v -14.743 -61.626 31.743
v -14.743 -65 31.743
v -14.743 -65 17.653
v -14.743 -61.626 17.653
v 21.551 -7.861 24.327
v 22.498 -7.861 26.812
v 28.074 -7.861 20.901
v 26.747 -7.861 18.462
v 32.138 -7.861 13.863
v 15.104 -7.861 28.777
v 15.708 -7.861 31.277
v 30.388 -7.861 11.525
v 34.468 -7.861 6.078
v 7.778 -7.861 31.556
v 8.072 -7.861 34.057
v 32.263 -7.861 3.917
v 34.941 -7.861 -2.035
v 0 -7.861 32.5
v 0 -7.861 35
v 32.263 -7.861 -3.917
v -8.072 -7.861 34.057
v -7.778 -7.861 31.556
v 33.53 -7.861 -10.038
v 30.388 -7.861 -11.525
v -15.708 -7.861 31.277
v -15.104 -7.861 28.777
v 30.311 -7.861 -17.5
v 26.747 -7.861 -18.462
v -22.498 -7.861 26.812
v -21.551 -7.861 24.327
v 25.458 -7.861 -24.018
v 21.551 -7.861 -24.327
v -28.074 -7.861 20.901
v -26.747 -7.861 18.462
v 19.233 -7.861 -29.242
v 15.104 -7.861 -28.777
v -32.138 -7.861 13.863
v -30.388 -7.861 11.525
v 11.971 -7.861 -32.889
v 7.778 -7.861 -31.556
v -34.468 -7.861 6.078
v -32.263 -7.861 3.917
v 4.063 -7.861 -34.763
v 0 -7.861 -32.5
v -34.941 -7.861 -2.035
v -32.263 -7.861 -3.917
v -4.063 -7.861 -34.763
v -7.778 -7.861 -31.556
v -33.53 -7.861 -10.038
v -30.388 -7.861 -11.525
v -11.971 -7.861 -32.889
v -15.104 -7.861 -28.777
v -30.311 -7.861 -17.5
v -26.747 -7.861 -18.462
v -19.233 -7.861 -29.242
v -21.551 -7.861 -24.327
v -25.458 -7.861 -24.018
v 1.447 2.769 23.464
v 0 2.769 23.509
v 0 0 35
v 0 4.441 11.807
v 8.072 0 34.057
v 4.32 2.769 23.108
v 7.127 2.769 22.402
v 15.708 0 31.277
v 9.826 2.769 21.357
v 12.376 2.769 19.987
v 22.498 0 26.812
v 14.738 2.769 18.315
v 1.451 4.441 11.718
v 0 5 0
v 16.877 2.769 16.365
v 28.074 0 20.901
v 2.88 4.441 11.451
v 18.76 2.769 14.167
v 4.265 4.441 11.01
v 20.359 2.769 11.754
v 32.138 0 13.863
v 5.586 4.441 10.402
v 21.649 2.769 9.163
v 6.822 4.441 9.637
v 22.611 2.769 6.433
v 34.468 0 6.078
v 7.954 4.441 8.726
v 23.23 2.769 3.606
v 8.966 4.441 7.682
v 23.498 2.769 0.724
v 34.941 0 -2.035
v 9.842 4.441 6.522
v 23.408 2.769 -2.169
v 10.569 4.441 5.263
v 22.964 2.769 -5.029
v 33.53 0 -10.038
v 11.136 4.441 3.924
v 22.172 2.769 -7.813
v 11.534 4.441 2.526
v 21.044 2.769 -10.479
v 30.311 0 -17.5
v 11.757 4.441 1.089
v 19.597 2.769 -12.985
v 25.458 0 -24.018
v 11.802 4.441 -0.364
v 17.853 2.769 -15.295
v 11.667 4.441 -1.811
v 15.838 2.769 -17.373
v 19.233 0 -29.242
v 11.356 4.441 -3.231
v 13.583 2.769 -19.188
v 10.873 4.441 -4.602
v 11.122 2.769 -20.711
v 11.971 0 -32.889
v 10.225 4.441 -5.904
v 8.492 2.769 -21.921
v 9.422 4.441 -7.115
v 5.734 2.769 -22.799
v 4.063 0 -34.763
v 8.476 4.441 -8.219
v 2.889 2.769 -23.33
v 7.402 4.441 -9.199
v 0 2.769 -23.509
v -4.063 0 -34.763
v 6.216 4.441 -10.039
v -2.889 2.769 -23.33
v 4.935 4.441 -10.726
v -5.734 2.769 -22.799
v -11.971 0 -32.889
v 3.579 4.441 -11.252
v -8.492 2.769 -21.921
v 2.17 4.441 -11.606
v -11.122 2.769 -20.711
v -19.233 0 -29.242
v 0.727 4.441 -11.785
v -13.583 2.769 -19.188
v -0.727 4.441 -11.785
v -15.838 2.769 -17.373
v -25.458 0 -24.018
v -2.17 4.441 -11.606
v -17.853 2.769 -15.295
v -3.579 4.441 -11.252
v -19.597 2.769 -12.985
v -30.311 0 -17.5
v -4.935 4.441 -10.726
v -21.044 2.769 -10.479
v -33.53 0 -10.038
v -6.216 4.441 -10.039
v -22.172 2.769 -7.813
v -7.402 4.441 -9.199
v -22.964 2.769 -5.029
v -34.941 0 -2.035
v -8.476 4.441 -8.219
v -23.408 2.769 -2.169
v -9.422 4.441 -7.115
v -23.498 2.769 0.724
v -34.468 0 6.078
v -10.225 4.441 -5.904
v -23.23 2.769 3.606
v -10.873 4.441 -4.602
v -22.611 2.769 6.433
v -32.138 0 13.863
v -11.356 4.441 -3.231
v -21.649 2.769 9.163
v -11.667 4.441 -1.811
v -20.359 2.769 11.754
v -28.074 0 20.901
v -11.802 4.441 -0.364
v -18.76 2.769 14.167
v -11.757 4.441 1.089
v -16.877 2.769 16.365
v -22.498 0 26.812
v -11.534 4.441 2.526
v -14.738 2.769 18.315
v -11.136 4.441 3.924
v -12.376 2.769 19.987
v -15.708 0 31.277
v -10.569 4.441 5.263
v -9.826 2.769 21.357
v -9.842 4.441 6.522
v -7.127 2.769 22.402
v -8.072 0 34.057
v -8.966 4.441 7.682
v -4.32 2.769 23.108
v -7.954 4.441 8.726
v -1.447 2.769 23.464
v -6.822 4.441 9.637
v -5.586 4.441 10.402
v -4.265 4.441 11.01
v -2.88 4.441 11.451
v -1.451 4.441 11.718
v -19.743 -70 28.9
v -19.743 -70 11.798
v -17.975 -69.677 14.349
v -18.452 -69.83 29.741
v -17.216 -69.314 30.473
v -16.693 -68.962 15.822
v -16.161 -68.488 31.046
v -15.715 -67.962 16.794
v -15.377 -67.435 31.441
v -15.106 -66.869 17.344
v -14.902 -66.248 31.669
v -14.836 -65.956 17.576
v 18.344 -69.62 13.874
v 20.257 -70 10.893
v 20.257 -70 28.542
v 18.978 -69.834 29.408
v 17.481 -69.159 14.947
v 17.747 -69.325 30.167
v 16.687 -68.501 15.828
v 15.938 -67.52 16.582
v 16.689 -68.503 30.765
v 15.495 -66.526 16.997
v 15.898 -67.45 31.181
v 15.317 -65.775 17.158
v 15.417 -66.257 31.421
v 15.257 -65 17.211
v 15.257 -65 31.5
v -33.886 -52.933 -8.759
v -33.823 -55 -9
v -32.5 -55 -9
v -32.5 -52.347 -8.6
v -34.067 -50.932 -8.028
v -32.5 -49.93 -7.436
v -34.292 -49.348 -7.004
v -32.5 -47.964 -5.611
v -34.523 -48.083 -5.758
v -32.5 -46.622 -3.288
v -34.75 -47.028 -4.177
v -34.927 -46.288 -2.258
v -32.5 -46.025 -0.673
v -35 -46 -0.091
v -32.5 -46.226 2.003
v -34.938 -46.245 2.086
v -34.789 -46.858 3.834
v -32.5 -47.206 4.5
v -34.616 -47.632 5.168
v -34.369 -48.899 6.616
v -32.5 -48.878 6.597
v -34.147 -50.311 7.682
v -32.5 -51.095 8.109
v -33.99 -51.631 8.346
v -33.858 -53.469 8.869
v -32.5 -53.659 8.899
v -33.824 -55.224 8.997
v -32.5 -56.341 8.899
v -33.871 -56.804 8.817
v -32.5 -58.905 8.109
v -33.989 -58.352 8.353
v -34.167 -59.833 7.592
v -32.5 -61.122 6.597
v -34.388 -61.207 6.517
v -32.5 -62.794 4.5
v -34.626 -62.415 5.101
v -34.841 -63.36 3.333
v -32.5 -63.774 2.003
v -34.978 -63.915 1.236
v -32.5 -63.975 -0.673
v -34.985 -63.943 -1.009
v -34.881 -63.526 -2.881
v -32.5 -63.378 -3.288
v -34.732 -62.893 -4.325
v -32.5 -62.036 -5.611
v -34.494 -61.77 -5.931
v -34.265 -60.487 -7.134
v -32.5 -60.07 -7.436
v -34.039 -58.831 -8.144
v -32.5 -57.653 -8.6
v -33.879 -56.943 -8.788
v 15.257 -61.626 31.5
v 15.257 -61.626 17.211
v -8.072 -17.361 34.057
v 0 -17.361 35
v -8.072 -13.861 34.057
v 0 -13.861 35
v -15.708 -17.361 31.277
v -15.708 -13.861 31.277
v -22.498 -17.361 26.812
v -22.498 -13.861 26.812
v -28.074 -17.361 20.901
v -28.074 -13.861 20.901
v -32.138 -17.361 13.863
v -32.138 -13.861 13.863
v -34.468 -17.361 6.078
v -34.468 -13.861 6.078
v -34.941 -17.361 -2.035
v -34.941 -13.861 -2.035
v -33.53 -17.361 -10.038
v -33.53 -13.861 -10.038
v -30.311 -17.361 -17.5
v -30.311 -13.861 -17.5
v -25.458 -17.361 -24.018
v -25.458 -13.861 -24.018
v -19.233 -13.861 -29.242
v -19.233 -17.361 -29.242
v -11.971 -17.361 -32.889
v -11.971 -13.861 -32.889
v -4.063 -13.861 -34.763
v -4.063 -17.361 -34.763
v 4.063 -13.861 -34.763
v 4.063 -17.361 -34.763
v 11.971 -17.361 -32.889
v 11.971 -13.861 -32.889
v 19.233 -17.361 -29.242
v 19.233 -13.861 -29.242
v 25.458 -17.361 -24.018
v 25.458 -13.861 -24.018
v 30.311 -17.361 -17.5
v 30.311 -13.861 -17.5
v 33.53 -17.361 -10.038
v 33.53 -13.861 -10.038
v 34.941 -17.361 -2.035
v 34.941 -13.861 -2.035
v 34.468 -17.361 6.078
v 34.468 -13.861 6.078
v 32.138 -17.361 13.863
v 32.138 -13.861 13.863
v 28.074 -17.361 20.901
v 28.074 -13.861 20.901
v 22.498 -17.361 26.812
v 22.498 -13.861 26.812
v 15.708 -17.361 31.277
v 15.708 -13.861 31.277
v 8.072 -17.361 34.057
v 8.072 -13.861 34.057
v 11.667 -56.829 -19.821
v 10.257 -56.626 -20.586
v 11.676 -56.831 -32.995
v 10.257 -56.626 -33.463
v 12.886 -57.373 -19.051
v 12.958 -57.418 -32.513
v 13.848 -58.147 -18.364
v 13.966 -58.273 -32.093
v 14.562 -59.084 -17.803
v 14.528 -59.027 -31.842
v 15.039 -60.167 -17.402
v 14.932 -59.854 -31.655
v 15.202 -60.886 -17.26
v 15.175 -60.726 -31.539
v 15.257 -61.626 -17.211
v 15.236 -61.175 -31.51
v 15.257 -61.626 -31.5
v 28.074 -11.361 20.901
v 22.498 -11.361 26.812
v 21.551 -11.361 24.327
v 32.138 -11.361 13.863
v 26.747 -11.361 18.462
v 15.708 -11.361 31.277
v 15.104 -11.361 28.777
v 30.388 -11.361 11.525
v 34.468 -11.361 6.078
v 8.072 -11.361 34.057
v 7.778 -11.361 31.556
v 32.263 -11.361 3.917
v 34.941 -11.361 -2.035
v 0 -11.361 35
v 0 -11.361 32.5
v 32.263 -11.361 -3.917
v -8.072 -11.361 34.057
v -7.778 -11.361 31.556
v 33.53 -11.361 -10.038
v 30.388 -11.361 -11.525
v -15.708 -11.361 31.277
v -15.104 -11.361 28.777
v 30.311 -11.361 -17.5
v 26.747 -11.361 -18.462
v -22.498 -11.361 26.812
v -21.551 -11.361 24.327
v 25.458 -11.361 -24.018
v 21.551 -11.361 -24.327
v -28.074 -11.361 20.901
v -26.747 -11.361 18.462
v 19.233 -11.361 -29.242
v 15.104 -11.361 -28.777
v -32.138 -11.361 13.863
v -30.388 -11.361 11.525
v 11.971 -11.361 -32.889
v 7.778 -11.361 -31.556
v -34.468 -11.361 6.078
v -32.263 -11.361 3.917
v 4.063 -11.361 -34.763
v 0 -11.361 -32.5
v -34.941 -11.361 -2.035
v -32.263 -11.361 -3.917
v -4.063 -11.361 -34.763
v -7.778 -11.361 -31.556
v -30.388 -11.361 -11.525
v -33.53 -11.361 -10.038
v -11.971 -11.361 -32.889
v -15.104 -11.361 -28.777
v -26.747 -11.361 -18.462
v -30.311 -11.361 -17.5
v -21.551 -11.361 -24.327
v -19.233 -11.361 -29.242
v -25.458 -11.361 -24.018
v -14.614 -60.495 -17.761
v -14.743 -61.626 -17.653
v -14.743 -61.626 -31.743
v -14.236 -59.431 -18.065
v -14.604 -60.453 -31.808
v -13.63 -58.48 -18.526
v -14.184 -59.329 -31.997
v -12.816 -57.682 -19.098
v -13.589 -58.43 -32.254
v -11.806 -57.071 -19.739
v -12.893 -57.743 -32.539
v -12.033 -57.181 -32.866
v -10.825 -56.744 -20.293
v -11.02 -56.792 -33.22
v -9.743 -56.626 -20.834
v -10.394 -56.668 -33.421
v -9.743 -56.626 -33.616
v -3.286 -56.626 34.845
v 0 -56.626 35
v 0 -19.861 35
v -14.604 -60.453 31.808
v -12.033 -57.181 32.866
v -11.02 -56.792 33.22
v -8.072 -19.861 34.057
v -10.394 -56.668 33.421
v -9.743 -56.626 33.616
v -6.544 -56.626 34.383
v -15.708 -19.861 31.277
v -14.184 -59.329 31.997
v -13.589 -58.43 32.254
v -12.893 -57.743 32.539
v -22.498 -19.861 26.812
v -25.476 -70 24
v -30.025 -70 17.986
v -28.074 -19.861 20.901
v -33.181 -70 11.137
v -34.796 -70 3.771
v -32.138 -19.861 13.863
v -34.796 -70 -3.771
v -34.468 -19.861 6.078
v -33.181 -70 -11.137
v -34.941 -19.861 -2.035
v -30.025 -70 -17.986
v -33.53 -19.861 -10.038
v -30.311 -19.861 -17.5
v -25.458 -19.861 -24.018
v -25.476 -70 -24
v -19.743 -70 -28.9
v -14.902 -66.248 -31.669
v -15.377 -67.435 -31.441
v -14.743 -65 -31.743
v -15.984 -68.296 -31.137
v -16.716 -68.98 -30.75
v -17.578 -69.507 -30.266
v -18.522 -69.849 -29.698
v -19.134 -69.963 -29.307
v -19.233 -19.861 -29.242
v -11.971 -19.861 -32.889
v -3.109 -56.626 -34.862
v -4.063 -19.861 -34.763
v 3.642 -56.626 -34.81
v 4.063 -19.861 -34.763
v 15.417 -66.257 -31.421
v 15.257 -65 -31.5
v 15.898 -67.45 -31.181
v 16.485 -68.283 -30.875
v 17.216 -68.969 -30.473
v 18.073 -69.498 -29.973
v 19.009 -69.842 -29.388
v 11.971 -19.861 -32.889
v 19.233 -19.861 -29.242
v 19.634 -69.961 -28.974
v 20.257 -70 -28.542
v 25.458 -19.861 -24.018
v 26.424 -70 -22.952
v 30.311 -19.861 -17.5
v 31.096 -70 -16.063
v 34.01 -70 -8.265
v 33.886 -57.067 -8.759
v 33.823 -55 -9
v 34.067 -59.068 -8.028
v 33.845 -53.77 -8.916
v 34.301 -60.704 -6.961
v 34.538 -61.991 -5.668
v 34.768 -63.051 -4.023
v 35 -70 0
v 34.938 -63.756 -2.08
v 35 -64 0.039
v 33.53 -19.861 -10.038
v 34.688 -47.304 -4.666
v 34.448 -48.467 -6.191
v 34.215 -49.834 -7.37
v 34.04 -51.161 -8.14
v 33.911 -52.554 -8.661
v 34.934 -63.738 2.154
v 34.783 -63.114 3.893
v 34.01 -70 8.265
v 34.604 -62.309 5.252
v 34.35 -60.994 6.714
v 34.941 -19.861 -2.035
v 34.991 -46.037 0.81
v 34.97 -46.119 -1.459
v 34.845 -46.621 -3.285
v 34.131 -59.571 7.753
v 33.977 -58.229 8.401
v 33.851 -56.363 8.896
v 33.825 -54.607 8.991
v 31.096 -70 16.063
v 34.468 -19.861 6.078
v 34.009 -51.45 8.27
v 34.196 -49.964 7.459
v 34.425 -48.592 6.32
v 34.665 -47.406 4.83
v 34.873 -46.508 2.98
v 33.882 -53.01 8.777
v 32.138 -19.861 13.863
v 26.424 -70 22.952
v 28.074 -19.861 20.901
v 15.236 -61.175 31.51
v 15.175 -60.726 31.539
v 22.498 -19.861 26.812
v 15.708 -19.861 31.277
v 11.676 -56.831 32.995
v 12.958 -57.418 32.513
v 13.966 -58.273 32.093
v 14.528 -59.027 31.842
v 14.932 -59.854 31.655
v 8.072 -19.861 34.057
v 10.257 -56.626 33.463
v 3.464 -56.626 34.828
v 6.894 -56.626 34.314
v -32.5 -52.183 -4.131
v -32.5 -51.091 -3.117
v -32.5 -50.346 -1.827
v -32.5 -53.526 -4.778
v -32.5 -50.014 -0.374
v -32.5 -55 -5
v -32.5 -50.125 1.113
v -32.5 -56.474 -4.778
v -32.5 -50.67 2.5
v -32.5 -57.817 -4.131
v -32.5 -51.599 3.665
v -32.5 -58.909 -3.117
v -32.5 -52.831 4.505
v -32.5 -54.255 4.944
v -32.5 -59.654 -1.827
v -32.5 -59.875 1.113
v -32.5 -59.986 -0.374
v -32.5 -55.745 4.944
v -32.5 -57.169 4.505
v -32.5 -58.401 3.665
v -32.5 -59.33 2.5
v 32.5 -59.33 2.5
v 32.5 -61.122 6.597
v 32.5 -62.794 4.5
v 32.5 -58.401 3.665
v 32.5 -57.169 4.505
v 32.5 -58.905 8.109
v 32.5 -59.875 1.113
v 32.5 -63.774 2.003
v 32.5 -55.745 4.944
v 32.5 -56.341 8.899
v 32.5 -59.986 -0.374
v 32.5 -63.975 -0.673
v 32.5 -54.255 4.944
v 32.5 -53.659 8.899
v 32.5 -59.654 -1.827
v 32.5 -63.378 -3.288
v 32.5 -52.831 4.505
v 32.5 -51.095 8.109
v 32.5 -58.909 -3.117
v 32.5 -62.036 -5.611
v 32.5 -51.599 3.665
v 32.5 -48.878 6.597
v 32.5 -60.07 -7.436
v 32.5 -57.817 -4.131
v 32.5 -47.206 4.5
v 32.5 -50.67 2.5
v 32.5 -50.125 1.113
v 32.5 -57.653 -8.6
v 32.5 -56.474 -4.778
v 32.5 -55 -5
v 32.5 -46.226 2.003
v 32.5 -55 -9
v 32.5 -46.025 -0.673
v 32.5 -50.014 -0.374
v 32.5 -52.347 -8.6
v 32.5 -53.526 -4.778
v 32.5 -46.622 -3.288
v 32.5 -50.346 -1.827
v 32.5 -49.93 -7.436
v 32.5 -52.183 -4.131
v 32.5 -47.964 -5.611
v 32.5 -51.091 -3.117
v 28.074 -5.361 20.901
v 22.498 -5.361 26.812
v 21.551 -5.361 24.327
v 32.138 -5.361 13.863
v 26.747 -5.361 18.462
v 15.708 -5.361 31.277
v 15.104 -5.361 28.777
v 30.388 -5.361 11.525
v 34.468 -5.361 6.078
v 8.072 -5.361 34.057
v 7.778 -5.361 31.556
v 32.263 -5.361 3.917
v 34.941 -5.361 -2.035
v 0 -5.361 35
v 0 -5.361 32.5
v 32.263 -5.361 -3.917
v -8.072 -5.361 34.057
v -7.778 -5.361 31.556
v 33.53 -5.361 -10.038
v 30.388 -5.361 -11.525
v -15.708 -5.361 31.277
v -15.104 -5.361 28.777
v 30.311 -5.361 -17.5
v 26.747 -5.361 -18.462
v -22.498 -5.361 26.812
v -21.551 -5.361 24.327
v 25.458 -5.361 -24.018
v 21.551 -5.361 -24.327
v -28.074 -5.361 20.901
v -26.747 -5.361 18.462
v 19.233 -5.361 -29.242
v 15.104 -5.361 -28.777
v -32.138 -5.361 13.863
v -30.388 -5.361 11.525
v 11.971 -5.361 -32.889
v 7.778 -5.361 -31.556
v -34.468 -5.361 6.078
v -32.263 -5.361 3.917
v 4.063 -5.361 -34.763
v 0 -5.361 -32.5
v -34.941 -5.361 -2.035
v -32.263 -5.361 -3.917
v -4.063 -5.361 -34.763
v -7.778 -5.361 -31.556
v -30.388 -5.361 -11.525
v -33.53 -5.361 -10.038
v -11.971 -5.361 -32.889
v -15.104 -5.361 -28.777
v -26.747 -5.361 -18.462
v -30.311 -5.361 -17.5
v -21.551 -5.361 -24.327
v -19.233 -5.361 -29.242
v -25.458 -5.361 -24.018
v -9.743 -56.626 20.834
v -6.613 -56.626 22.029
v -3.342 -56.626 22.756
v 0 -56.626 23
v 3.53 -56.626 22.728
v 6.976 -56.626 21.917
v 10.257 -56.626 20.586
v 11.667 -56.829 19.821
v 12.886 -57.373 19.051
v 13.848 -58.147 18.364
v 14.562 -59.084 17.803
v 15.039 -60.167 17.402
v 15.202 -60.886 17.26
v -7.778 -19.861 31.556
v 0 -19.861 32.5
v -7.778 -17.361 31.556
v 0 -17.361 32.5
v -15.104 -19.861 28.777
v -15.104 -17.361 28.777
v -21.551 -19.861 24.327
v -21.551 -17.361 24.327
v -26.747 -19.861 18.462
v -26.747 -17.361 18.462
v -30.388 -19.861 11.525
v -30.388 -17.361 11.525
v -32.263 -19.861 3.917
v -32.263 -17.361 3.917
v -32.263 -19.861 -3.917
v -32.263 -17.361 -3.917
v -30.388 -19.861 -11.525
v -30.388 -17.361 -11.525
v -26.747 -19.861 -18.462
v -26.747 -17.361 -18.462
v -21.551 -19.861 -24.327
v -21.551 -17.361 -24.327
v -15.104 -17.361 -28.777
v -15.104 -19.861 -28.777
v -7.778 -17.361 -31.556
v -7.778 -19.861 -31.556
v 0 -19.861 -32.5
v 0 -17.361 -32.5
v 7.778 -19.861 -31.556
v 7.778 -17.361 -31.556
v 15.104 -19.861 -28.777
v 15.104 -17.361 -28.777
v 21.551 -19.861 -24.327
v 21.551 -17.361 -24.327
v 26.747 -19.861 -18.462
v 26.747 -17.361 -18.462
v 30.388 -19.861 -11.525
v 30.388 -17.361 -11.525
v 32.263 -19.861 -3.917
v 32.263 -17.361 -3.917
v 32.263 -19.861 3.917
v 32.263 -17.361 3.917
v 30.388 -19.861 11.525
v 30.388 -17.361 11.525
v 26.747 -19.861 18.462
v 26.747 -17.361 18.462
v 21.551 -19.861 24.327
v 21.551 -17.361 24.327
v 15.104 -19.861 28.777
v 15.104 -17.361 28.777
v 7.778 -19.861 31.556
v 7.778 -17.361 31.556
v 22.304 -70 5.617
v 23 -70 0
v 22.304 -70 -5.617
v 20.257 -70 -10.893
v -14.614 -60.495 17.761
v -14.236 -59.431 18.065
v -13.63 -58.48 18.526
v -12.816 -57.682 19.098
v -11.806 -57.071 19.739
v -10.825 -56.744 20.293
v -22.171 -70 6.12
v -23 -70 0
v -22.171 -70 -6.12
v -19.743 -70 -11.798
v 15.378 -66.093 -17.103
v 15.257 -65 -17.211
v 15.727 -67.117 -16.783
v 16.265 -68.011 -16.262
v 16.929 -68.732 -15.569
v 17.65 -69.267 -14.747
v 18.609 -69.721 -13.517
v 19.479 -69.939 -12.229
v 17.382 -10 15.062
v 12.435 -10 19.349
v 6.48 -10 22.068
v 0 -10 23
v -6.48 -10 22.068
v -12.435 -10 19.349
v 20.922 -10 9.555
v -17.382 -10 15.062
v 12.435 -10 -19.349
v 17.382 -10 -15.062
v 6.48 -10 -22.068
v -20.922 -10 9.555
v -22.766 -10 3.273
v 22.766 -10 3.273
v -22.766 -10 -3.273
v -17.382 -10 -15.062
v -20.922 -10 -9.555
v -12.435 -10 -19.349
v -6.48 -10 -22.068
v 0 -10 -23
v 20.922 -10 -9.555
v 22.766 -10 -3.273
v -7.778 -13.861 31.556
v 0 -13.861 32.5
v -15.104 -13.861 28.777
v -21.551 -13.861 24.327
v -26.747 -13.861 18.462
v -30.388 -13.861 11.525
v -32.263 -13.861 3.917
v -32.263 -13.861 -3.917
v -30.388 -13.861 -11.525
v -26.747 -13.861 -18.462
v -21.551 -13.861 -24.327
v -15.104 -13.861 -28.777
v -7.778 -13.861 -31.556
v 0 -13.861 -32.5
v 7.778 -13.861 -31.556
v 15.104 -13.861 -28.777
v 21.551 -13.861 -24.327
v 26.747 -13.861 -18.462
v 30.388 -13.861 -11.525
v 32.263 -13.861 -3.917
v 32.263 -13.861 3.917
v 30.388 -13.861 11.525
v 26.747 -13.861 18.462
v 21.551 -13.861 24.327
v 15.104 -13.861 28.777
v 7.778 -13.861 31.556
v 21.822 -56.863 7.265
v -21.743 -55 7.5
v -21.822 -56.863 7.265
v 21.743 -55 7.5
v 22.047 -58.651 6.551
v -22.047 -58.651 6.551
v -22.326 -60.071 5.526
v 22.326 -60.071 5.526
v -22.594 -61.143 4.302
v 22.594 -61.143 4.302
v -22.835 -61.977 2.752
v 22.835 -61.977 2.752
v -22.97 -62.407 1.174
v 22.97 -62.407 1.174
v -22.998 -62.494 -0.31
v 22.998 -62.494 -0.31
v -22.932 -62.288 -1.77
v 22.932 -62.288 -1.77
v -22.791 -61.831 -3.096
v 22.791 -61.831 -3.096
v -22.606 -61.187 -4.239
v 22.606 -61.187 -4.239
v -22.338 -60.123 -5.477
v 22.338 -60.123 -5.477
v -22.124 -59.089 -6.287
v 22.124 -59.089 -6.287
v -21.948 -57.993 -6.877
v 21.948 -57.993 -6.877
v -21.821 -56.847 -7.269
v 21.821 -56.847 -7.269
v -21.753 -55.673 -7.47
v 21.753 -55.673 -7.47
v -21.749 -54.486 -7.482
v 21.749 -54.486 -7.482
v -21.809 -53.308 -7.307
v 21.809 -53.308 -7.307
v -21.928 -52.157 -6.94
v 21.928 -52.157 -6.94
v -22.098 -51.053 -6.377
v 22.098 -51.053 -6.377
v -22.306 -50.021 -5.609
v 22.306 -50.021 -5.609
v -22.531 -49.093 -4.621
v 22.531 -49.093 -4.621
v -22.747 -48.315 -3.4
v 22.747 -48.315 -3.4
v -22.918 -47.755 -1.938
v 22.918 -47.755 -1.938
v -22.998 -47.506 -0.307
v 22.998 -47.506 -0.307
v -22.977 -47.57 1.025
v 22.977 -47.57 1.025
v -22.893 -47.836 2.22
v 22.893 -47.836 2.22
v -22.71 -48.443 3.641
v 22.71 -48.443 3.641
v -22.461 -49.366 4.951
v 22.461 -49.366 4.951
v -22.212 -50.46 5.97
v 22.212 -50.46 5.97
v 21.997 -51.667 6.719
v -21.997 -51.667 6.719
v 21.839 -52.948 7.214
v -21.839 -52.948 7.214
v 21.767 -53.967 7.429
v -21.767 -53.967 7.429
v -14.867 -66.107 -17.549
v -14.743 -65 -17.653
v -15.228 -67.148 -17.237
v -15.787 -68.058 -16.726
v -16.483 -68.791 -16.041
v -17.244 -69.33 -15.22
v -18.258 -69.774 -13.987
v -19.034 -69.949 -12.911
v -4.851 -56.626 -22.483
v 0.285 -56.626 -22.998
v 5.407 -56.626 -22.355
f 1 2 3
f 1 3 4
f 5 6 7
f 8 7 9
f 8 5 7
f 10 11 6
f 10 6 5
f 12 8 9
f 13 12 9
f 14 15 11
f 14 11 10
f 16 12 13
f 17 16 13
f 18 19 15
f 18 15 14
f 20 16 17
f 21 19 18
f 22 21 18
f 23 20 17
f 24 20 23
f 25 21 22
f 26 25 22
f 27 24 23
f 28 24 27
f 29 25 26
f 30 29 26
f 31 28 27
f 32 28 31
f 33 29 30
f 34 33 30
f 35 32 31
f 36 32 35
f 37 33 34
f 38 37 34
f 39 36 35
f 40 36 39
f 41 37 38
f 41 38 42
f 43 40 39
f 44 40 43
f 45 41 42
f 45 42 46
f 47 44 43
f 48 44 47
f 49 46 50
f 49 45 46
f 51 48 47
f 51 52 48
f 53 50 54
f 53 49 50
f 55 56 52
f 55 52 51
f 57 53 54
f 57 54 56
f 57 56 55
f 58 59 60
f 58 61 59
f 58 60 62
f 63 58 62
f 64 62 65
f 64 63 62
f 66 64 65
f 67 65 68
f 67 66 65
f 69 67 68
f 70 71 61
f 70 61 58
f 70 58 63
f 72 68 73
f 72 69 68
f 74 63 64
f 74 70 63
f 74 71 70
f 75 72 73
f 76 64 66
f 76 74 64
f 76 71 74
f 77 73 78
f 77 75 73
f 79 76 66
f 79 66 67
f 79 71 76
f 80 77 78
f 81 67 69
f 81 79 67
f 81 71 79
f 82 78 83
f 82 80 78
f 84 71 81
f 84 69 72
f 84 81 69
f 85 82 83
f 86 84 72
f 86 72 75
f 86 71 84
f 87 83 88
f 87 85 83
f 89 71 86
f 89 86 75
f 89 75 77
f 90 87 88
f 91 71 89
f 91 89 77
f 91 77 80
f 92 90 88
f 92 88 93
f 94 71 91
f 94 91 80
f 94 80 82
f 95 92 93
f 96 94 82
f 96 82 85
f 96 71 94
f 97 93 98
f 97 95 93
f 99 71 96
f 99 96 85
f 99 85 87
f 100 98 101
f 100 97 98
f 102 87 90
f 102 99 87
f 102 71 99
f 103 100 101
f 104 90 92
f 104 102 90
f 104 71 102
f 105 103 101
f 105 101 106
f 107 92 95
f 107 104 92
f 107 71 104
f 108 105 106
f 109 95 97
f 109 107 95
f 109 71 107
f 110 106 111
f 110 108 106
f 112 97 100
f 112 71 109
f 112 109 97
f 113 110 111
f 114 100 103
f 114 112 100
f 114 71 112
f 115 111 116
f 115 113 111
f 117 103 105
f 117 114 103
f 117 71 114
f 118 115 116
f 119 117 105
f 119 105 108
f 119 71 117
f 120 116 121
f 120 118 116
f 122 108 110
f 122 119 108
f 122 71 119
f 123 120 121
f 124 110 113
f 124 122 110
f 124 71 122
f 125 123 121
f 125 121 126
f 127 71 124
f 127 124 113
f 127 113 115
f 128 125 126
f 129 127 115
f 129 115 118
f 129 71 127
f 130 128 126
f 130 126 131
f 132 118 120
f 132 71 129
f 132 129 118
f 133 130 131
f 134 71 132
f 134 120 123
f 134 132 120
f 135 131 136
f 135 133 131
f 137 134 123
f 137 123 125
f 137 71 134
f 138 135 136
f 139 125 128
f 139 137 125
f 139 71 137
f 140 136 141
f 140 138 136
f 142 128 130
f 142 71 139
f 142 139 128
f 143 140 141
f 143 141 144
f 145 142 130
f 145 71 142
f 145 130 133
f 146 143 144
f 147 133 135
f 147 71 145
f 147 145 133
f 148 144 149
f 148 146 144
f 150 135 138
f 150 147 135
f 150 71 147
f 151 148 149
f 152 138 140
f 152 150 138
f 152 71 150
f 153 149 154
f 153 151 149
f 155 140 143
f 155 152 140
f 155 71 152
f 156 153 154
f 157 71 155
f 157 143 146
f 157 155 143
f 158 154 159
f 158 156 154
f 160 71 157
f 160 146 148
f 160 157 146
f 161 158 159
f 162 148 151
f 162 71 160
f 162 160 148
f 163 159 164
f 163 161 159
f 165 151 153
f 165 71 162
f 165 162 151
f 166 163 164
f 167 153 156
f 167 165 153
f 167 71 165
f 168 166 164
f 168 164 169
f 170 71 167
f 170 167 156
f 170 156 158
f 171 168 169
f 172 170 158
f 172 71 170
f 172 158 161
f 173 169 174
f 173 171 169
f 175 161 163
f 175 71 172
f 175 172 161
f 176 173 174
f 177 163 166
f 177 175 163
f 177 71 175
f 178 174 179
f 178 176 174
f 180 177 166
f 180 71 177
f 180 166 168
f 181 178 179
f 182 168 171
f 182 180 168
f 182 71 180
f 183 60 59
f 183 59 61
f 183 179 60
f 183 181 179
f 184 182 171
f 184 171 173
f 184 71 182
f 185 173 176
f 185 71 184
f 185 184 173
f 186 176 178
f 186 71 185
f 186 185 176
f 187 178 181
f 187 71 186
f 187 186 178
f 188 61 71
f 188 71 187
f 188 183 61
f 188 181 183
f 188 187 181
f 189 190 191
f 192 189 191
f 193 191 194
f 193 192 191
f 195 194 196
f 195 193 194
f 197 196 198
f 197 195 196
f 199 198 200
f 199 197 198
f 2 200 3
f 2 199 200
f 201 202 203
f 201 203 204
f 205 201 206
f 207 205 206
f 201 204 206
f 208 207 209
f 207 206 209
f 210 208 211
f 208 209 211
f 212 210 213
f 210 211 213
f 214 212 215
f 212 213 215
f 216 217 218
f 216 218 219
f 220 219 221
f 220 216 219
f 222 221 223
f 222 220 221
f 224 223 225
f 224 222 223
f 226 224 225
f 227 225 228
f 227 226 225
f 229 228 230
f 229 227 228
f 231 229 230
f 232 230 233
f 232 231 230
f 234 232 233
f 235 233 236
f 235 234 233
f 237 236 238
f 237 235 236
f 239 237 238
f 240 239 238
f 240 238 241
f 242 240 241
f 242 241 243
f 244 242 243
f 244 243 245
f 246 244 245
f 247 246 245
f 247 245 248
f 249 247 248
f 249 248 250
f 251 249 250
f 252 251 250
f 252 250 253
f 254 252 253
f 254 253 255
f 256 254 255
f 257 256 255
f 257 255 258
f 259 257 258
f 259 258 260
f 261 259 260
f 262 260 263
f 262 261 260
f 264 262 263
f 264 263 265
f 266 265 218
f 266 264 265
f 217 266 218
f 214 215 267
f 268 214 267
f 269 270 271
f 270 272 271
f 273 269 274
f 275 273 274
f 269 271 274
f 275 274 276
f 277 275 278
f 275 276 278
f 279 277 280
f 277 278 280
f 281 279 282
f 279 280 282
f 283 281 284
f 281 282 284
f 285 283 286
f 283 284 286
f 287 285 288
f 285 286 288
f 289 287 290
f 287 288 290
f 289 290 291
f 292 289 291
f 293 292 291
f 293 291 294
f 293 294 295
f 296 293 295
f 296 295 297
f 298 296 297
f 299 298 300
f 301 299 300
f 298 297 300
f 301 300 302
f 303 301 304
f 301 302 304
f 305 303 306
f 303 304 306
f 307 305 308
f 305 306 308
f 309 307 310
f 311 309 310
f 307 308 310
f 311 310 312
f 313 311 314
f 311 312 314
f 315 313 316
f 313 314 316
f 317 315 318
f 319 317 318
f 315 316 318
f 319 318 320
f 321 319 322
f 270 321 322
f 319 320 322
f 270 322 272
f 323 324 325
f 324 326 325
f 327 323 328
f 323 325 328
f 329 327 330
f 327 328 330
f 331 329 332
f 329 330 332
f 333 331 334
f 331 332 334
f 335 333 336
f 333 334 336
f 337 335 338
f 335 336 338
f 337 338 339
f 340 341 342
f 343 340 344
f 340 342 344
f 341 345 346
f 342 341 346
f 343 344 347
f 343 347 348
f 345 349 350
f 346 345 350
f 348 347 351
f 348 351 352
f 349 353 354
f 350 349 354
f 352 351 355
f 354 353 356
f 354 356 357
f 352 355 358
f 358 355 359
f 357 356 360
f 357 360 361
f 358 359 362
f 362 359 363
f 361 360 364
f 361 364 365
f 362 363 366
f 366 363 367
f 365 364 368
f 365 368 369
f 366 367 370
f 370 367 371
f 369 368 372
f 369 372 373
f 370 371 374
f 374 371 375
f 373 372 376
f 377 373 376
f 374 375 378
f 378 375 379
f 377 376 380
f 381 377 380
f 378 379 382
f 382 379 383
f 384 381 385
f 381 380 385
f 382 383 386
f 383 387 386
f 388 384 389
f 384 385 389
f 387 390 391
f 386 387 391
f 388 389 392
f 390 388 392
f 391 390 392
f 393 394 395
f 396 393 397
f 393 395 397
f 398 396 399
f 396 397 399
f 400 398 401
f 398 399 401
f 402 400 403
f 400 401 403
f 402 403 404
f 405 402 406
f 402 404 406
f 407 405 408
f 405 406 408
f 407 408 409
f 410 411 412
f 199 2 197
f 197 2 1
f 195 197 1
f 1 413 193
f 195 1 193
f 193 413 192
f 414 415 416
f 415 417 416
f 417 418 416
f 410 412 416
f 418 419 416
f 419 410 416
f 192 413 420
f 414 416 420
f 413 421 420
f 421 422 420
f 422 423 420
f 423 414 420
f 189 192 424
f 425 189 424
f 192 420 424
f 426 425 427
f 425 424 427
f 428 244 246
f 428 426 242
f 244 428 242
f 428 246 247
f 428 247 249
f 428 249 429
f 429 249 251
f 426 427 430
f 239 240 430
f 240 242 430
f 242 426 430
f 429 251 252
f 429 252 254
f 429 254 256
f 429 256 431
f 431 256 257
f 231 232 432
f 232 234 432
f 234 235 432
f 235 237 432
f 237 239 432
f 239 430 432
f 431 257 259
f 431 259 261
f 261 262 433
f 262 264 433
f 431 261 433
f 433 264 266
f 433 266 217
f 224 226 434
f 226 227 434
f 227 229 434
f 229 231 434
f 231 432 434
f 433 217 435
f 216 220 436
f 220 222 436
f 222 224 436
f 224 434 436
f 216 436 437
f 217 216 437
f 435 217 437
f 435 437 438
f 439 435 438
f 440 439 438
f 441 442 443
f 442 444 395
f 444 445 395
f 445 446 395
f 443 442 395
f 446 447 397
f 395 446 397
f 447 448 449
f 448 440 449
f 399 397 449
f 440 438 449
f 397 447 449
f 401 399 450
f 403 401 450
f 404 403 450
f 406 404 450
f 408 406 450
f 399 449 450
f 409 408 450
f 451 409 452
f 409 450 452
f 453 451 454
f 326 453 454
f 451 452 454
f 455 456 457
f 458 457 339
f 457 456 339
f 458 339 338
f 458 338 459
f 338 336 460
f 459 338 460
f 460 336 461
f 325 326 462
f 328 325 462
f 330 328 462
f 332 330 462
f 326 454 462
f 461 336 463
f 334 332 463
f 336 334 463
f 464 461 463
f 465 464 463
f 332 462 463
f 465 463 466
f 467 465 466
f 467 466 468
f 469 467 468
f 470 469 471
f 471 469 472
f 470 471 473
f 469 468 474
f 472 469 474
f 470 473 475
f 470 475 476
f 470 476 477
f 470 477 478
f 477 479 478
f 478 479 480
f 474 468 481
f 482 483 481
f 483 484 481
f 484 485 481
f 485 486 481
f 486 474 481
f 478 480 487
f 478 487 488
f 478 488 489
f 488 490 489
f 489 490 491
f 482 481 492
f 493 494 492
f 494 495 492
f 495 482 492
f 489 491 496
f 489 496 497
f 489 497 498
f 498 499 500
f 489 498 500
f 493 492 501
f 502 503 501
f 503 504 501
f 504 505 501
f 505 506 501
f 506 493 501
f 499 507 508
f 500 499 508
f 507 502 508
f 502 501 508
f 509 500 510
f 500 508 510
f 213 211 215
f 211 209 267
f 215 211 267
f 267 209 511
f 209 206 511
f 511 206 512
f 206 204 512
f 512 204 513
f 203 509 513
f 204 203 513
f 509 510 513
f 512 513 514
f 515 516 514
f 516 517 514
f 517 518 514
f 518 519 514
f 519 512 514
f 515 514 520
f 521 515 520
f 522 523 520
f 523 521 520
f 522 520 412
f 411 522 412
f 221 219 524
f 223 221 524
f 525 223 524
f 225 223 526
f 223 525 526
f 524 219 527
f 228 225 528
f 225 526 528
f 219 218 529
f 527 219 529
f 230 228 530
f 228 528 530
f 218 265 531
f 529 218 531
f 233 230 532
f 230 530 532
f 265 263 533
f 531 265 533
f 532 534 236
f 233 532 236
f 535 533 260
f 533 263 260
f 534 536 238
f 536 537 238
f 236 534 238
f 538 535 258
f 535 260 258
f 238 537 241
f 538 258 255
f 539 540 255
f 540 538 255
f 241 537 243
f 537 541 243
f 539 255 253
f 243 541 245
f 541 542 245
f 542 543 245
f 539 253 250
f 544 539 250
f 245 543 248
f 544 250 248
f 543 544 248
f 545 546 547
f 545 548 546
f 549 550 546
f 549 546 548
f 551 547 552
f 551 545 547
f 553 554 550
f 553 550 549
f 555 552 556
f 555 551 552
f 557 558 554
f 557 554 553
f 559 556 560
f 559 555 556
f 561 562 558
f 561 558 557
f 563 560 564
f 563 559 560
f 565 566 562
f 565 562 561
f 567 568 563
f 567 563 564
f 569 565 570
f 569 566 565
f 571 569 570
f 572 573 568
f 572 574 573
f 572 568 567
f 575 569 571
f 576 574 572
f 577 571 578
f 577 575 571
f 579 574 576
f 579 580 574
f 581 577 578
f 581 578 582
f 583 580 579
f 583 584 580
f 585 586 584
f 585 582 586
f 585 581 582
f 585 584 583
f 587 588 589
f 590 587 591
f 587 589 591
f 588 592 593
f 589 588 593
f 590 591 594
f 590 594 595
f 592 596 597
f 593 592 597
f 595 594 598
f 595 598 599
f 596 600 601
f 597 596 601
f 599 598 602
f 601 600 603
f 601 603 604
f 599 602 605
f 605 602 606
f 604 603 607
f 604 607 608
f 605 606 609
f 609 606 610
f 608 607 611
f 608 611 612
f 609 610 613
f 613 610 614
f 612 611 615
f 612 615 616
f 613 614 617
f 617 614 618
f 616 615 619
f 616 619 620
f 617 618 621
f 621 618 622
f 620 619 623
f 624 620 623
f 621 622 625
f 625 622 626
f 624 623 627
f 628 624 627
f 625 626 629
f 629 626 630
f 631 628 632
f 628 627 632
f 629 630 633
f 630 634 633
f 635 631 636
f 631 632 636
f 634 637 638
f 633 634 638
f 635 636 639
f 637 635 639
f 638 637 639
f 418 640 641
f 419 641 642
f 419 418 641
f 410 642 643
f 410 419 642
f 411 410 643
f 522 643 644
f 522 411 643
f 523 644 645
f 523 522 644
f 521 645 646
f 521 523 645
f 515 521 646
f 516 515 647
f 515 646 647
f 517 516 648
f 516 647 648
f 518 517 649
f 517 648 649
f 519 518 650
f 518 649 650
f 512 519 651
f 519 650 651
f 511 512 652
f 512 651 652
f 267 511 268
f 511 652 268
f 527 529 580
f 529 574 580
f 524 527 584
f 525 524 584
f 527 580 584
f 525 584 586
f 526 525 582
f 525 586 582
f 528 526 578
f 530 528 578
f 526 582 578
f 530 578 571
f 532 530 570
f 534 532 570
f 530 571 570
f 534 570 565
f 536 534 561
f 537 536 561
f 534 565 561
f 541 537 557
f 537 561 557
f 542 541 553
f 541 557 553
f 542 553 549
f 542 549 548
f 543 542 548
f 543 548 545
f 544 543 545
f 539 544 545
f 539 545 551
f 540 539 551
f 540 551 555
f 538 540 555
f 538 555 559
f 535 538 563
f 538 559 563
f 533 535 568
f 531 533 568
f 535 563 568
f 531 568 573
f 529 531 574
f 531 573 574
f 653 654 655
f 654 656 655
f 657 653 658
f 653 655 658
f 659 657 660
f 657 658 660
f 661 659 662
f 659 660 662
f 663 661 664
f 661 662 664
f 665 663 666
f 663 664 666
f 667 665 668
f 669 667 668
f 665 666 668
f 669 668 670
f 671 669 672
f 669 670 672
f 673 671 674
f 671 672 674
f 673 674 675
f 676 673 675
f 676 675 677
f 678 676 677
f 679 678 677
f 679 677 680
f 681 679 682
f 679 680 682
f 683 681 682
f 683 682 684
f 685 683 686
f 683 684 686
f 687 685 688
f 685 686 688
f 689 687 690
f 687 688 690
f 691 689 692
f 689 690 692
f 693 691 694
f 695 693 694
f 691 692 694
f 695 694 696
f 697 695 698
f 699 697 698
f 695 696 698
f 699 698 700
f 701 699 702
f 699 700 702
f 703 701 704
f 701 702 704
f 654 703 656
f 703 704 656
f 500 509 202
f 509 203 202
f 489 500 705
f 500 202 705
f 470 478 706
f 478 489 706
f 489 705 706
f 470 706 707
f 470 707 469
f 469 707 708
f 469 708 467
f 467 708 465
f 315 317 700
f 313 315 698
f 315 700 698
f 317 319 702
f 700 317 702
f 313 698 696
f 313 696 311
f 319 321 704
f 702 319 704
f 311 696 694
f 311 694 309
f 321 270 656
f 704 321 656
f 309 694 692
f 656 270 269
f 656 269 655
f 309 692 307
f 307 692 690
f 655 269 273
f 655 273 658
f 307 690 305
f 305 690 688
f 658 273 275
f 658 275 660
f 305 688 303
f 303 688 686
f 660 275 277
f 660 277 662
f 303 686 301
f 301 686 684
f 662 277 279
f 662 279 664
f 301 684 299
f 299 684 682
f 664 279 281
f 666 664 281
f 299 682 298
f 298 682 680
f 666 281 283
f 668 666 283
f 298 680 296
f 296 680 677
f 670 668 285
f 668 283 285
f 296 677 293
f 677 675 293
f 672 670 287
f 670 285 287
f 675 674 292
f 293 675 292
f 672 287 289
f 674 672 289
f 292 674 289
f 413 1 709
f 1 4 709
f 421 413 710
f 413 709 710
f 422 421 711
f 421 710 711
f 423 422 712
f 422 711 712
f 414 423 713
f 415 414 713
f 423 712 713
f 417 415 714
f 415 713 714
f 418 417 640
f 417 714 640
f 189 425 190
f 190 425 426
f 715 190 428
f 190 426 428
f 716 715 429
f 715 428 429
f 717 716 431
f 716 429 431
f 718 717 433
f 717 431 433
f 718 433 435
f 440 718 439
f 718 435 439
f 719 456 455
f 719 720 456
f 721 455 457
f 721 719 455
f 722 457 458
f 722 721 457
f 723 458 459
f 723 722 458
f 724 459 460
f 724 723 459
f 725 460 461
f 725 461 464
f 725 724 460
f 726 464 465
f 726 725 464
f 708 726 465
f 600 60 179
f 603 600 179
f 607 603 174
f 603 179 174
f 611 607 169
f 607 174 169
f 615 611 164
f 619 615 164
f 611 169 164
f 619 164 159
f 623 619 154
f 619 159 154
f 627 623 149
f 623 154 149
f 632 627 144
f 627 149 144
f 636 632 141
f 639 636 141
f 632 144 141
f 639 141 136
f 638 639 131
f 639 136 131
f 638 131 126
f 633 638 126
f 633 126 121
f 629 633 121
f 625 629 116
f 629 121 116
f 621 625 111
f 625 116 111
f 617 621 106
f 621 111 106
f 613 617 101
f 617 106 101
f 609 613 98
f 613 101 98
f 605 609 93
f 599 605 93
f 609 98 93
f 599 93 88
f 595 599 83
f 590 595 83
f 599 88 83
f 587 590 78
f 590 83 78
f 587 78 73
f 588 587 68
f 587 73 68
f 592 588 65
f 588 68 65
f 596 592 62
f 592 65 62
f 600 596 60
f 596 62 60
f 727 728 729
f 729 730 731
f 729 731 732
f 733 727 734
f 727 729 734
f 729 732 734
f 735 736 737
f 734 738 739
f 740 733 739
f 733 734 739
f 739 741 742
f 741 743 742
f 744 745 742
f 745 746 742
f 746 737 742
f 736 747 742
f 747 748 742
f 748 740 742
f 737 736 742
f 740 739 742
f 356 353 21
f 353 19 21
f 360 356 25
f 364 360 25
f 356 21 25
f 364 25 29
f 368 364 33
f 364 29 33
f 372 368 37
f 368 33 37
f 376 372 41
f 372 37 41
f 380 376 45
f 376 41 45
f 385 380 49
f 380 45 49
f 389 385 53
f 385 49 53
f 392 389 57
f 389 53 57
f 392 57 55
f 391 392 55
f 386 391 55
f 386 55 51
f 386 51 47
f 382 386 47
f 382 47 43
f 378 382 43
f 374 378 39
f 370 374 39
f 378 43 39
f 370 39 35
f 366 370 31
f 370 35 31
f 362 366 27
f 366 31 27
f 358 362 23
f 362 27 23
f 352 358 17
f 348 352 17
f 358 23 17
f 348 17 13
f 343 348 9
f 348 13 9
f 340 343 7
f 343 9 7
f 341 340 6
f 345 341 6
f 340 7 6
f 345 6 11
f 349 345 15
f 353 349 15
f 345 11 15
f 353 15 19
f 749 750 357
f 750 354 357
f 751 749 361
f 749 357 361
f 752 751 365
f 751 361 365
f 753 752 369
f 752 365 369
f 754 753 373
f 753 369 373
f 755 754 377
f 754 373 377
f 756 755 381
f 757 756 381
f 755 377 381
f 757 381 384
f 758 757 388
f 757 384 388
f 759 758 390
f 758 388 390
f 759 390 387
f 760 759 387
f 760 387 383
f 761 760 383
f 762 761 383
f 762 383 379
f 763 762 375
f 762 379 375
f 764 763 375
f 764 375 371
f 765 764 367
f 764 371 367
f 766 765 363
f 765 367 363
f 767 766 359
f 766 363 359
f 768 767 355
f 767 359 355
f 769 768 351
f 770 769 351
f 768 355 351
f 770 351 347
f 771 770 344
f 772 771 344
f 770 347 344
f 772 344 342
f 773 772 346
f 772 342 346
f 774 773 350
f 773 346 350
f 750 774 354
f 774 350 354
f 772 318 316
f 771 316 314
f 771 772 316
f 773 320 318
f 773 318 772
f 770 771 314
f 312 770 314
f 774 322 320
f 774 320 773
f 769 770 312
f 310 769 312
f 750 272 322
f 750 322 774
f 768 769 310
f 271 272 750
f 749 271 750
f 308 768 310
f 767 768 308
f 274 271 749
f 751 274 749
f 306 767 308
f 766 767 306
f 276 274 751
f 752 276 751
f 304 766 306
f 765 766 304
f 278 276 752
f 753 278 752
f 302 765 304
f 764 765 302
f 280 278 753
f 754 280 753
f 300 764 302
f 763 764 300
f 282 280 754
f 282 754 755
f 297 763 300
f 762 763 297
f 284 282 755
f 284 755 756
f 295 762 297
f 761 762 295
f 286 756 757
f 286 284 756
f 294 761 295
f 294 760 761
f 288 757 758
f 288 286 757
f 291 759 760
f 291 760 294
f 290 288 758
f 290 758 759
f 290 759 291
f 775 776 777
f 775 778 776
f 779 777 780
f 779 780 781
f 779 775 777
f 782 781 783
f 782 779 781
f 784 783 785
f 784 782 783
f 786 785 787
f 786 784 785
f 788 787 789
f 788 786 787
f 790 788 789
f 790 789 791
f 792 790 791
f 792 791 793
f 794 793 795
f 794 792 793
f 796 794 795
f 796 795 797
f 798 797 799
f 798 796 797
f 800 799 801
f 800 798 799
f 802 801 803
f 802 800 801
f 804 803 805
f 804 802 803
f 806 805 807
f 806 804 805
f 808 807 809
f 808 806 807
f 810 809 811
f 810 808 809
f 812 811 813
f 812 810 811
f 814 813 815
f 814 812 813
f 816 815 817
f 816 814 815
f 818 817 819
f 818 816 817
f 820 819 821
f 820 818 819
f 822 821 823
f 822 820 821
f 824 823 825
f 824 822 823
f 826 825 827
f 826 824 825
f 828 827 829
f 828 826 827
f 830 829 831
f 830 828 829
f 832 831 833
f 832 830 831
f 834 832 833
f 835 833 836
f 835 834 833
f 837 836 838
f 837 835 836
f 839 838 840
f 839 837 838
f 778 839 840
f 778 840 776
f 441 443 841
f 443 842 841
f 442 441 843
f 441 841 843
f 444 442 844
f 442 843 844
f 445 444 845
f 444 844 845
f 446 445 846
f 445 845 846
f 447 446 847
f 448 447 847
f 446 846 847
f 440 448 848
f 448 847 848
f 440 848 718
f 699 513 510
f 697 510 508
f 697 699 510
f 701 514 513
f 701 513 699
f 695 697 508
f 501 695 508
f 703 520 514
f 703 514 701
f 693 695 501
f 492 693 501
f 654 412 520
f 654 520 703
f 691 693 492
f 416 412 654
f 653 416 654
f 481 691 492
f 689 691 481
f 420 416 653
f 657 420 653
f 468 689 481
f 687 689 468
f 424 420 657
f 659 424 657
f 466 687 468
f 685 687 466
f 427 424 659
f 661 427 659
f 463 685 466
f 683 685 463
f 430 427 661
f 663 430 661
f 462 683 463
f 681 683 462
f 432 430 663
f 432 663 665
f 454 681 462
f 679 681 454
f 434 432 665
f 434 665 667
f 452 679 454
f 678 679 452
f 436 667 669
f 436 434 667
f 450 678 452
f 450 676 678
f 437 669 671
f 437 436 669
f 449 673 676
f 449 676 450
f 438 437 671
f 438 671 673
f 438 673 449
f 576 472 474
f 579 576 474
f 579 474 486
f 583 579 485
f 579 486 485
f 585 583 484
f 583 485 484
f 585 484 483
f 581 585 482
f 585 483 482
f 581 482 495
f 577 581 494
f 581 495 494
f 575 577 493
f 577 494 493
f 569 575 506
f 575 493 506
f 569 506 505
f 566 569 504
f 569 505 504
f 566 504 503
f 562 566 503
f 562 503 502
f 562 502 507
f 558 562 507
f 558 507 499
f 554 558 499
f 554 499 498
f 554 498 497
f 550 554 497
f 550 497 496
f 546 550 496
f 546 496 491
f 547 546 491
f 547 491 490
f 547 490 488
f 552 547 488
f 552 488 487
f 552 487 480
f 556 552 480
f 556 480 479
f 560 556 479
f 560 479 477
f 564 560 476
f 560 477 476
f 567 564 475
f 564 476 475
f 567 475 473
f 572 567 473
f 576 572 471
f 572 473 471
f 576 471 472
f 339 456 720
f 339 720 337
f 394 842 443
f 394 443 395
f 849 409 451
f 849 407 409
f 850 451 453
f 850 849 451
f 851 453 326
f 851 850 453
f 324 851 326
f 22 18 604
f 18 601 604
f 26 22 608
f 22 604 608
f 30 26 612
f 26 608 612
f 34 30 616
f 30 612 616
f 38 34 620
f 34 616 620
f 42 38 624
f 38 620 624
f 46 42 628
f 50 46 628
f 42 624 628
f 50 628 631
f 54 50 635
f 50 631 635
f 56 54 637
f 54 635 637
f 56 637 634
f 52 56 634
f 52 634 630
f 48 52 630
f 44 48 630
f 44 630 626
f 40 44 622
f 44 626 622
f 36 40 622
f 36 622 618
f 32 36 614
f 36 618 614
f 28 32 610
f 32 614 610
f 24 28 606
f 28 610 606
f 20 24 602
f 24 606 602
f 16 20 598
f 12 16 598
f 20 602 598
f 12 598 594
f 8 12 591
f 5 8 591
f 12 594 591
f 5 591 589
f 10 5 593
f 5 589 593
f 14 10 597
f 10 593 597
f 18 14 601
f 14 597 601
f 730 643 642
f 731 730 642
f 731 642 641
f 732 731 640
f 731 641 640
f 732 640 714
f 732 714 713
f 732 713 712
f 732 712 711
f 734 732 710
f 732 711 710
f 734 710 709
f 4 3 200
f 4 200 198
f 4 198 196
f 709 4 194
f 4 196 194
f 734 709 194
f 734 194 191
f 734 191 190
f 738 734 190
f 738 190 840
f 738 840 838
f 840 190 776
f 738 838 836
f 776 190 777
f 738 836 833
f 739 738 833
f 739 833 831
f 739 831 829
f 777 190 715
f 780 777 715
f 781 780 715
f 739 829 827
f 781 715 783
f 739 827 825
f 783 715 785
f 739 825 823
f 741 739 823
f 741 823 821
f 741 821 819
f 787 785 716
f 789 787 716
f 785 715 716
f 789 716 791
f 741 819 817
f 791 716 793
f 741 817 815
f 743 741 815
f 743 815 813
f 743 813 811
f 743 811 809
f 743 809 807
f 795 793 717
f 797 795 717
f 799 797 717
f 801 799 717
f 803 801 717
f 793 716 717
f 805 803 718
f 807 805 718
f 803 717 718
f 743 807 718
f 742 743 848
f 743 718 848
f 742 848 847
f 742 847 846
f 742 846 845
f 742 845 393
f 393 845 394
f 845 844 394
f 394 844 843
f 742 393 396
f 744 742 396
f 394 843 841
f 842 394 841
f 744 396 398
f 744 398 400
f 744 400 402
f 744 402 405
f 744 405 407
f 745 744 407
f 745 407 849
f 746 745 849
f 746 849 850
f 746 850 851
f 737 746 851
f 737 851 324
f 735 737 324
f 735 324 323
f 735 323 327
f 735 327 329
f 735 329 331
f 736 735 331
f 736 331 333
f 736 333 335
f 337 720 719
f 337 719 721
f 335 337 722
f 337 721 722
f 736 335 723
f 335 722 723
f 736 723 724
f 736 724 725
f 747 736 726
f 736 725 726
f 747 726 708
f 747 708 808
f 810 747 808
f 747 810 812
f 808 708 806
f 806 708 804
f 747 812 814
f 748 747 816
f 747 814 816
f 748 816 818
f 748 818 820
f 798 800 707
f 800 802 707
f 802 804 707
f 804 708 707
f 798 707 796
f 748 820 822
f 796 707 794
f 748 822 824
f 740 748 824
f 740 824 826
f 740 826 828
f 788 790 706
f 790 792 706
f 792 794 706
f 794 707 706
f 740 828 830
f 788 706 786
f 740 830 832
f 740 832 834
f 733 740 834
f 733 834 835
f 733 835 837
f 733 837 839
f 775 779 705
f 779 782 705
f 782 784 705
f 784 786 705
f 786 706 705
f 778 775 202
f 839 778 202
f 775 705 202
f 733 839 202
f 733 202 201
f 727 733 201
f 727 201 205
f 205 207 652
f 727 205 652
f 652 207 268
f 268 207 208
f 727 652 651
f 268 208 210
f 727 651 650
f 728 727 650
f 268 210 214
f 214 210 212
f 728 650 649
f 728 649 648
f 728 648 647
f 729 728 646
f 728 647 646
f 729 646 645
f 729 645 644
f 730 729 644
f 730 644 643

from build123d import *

# Parameters (mm, degrees)
SKETCH3_W           = 2.5
SKETCH3_H           = 2.5
LPATTERN2_COUNT     = 3
LPATTERN2_PITCH     = 6
SKETCH6_W           = 30
SKETCH6_H           = 13.374164213
CUT_EXTRUDE1_DEPTH  = 35
FILLET1_R           = 5
FILLET2_R           = 5
FILLET3_R           = 5
DOME1_FACE_RADIUS   = 35
DOME1_HEIGHT        = 5
SKETCH8_R           = 9
CUT_EXTRUDE2_DEPTH  = 2.5
SKETCH9_R           = 7.5
BOSS_EXTRUDE1_DEPTH = 32.5
SKETCH10_R          = 5
CUT_EXTRUDE3_DEPTH  = 32.5


with BuildPart() as part:
    # Sketch2 → Revolve1 (revolve)
    with BuildSketch(Plane.XY, mode=Mode.PRIVATE) as revolve1_sk:
        Polygon((0, 0), (0, -10), (23, -10), (23, -70), (35, -70), (35, 0), align=None)
    revolve(revolve1_sk.sketch.rotate(Axis((0, 0, 0), (0, -1, 0)), 90), axis=Axis((0, 0, 0), (0, -1, 0)))

    # Sketch3 → Cut-Revolve2 (revolve, cut)
    with BuildSketch(Plane.XY, mode=Mode.PRIVATE) as cut_revolve2_sk:
        with Locations((33.75, -6.610674558)):
            Rectangle(SKETCH3_W, SKETCH3_H)
    cut_revolve2 = revolve(cut_revolve2_sk.sketch.rotate(Axis((0, 0, 0), (0, -1, 0)), 90), axis=Axis((0, 0, 0), (0, -1, 0)), mode=Mode.SUBTRACT)

    # LPattern2: Cut-Revolve2 ×3
    with Locations(*[(0, -i * LPATTERN2_PITCH, 0) for i in range(1, LPATTERN2_COUNT)]):
        add(cut_revolve2, mode=Mode.SUBTRACT)

    # Sketch6 → Cut-Extrude1 (cut, symmetric)
    with BuildSketch(Plane.XY):
        with Locations((0.25670187, -63.312917893)):
            Rectangle(SKETCH6_W, SKETCH6_H)
    extrude(amount=CUT_EXTRUDE1_DEPTH, both=True, mode=Mode.SUBTRACT)

    # Fillet1
    fillet1_edges = [part.edges().sort_by_distance(p)[0] for p in [
        (-14.74329813, -56.625835787, 24.698230373),
    ]]
    fillet(fillet1_edges, radius=FILLET1_R)

    # Fillet2
    fillet2_edges = [part.edges().sort_by_distance(p)[0] for p in [
        (15.25670187, -56.625835787, 24.355576471),
        (-14.74329813, -56.625835787, -24.698230373),
        (15.25670187, -56.625835787, -24.355576471),
    ]]
    fillet(fillet2_edges, radius=FILLET2_R)

    # Fillet3
    fillet3_edges = [part.edges().sort_by_distance(p)[0] for p in [
        (15.25670187, -70, 24.355576471),
        (-14.74329813, -70, 24.698230373),
        (15.25670187, -70, -24.355576471),
        (-14.74329813, -70, -24.698230373),
    ]]
    fillet(fillet3_edges, radius=FILLET3_R)

    # Dome1: a dome of height H over a round flat face of radius A is a cap of a sphere of radius (A * A + H * H) / (2 * H)
    dome1_r = (DOME1_FACE_RADIUS * DOME1_FACE_RADIUS + DOME1_HEIGHT * DOME1_HEIGHT) / (2 * DOME1_HEIGHT)
    dome1_base = Plane((0, 0, 0), z_dir=(0, 1, 0))
    with Locations(dome1_base.offset(DOME1_HEIGHT - dome1_r)):
        dome1_ball = Sphere(dome1_r, mode=Mode.PRIVATE)
    add(split(dome1_ball, bisect_by=dome1_base, keep=Keep.TOP, mode=Mode.PRIVATE))

    # Sketch8 → Cut-Extrude2 (cut)
    with BuildSketch(Plane(origin=(35, 0, 0), x_dir=(0, 0, -1), z_dir=(1, 0, 0))):
        with Locations((0, -55)):
            Circle(SKETCH8_R)
    cut_extrude2 = extrude(amount=-CUT_EXTRUDE2_DEPTH, mode=Mode.SUBTRACT)

    # Mirror1: Cut-Extrude2 across plane
    add(cut_extrude2.mirror(Plane(origin=(0, 0, 0), x_dir=(0, 0, 1), z_dir=(1, 0, 0))), mode=Mode.SUBTRACT)

    # Sketch9 → Boss-Extrude1 (add, symmetric)
    with BuildSketch(Plane(origin=(0, 0, 0), x_dir=(0, 0, -1), z_dir=(1, 0, 0))):
        with Locations(Location((0, -55, 0), (0, 0, 180))):
            Circle(SKETCH9_R)
    extrude(amount=BOSS_EXTRUDE1_DEPTH, both=True)

    # Sketch10 → Cut-Extrude3 (cut, symmetric)
    with BuildSketch(Plane(origin=(0, 0, 0), x_dir=(0, 0, -1), z_dir=(1, 0, 0))):
        with Locations((0, -55)):
            Circle(SKETCH10_R)
    extrude(amount=CUT_EXTRUDE3_DEPTH, both=True, mode=Mode.SUBTRACT)


solid = part.part
